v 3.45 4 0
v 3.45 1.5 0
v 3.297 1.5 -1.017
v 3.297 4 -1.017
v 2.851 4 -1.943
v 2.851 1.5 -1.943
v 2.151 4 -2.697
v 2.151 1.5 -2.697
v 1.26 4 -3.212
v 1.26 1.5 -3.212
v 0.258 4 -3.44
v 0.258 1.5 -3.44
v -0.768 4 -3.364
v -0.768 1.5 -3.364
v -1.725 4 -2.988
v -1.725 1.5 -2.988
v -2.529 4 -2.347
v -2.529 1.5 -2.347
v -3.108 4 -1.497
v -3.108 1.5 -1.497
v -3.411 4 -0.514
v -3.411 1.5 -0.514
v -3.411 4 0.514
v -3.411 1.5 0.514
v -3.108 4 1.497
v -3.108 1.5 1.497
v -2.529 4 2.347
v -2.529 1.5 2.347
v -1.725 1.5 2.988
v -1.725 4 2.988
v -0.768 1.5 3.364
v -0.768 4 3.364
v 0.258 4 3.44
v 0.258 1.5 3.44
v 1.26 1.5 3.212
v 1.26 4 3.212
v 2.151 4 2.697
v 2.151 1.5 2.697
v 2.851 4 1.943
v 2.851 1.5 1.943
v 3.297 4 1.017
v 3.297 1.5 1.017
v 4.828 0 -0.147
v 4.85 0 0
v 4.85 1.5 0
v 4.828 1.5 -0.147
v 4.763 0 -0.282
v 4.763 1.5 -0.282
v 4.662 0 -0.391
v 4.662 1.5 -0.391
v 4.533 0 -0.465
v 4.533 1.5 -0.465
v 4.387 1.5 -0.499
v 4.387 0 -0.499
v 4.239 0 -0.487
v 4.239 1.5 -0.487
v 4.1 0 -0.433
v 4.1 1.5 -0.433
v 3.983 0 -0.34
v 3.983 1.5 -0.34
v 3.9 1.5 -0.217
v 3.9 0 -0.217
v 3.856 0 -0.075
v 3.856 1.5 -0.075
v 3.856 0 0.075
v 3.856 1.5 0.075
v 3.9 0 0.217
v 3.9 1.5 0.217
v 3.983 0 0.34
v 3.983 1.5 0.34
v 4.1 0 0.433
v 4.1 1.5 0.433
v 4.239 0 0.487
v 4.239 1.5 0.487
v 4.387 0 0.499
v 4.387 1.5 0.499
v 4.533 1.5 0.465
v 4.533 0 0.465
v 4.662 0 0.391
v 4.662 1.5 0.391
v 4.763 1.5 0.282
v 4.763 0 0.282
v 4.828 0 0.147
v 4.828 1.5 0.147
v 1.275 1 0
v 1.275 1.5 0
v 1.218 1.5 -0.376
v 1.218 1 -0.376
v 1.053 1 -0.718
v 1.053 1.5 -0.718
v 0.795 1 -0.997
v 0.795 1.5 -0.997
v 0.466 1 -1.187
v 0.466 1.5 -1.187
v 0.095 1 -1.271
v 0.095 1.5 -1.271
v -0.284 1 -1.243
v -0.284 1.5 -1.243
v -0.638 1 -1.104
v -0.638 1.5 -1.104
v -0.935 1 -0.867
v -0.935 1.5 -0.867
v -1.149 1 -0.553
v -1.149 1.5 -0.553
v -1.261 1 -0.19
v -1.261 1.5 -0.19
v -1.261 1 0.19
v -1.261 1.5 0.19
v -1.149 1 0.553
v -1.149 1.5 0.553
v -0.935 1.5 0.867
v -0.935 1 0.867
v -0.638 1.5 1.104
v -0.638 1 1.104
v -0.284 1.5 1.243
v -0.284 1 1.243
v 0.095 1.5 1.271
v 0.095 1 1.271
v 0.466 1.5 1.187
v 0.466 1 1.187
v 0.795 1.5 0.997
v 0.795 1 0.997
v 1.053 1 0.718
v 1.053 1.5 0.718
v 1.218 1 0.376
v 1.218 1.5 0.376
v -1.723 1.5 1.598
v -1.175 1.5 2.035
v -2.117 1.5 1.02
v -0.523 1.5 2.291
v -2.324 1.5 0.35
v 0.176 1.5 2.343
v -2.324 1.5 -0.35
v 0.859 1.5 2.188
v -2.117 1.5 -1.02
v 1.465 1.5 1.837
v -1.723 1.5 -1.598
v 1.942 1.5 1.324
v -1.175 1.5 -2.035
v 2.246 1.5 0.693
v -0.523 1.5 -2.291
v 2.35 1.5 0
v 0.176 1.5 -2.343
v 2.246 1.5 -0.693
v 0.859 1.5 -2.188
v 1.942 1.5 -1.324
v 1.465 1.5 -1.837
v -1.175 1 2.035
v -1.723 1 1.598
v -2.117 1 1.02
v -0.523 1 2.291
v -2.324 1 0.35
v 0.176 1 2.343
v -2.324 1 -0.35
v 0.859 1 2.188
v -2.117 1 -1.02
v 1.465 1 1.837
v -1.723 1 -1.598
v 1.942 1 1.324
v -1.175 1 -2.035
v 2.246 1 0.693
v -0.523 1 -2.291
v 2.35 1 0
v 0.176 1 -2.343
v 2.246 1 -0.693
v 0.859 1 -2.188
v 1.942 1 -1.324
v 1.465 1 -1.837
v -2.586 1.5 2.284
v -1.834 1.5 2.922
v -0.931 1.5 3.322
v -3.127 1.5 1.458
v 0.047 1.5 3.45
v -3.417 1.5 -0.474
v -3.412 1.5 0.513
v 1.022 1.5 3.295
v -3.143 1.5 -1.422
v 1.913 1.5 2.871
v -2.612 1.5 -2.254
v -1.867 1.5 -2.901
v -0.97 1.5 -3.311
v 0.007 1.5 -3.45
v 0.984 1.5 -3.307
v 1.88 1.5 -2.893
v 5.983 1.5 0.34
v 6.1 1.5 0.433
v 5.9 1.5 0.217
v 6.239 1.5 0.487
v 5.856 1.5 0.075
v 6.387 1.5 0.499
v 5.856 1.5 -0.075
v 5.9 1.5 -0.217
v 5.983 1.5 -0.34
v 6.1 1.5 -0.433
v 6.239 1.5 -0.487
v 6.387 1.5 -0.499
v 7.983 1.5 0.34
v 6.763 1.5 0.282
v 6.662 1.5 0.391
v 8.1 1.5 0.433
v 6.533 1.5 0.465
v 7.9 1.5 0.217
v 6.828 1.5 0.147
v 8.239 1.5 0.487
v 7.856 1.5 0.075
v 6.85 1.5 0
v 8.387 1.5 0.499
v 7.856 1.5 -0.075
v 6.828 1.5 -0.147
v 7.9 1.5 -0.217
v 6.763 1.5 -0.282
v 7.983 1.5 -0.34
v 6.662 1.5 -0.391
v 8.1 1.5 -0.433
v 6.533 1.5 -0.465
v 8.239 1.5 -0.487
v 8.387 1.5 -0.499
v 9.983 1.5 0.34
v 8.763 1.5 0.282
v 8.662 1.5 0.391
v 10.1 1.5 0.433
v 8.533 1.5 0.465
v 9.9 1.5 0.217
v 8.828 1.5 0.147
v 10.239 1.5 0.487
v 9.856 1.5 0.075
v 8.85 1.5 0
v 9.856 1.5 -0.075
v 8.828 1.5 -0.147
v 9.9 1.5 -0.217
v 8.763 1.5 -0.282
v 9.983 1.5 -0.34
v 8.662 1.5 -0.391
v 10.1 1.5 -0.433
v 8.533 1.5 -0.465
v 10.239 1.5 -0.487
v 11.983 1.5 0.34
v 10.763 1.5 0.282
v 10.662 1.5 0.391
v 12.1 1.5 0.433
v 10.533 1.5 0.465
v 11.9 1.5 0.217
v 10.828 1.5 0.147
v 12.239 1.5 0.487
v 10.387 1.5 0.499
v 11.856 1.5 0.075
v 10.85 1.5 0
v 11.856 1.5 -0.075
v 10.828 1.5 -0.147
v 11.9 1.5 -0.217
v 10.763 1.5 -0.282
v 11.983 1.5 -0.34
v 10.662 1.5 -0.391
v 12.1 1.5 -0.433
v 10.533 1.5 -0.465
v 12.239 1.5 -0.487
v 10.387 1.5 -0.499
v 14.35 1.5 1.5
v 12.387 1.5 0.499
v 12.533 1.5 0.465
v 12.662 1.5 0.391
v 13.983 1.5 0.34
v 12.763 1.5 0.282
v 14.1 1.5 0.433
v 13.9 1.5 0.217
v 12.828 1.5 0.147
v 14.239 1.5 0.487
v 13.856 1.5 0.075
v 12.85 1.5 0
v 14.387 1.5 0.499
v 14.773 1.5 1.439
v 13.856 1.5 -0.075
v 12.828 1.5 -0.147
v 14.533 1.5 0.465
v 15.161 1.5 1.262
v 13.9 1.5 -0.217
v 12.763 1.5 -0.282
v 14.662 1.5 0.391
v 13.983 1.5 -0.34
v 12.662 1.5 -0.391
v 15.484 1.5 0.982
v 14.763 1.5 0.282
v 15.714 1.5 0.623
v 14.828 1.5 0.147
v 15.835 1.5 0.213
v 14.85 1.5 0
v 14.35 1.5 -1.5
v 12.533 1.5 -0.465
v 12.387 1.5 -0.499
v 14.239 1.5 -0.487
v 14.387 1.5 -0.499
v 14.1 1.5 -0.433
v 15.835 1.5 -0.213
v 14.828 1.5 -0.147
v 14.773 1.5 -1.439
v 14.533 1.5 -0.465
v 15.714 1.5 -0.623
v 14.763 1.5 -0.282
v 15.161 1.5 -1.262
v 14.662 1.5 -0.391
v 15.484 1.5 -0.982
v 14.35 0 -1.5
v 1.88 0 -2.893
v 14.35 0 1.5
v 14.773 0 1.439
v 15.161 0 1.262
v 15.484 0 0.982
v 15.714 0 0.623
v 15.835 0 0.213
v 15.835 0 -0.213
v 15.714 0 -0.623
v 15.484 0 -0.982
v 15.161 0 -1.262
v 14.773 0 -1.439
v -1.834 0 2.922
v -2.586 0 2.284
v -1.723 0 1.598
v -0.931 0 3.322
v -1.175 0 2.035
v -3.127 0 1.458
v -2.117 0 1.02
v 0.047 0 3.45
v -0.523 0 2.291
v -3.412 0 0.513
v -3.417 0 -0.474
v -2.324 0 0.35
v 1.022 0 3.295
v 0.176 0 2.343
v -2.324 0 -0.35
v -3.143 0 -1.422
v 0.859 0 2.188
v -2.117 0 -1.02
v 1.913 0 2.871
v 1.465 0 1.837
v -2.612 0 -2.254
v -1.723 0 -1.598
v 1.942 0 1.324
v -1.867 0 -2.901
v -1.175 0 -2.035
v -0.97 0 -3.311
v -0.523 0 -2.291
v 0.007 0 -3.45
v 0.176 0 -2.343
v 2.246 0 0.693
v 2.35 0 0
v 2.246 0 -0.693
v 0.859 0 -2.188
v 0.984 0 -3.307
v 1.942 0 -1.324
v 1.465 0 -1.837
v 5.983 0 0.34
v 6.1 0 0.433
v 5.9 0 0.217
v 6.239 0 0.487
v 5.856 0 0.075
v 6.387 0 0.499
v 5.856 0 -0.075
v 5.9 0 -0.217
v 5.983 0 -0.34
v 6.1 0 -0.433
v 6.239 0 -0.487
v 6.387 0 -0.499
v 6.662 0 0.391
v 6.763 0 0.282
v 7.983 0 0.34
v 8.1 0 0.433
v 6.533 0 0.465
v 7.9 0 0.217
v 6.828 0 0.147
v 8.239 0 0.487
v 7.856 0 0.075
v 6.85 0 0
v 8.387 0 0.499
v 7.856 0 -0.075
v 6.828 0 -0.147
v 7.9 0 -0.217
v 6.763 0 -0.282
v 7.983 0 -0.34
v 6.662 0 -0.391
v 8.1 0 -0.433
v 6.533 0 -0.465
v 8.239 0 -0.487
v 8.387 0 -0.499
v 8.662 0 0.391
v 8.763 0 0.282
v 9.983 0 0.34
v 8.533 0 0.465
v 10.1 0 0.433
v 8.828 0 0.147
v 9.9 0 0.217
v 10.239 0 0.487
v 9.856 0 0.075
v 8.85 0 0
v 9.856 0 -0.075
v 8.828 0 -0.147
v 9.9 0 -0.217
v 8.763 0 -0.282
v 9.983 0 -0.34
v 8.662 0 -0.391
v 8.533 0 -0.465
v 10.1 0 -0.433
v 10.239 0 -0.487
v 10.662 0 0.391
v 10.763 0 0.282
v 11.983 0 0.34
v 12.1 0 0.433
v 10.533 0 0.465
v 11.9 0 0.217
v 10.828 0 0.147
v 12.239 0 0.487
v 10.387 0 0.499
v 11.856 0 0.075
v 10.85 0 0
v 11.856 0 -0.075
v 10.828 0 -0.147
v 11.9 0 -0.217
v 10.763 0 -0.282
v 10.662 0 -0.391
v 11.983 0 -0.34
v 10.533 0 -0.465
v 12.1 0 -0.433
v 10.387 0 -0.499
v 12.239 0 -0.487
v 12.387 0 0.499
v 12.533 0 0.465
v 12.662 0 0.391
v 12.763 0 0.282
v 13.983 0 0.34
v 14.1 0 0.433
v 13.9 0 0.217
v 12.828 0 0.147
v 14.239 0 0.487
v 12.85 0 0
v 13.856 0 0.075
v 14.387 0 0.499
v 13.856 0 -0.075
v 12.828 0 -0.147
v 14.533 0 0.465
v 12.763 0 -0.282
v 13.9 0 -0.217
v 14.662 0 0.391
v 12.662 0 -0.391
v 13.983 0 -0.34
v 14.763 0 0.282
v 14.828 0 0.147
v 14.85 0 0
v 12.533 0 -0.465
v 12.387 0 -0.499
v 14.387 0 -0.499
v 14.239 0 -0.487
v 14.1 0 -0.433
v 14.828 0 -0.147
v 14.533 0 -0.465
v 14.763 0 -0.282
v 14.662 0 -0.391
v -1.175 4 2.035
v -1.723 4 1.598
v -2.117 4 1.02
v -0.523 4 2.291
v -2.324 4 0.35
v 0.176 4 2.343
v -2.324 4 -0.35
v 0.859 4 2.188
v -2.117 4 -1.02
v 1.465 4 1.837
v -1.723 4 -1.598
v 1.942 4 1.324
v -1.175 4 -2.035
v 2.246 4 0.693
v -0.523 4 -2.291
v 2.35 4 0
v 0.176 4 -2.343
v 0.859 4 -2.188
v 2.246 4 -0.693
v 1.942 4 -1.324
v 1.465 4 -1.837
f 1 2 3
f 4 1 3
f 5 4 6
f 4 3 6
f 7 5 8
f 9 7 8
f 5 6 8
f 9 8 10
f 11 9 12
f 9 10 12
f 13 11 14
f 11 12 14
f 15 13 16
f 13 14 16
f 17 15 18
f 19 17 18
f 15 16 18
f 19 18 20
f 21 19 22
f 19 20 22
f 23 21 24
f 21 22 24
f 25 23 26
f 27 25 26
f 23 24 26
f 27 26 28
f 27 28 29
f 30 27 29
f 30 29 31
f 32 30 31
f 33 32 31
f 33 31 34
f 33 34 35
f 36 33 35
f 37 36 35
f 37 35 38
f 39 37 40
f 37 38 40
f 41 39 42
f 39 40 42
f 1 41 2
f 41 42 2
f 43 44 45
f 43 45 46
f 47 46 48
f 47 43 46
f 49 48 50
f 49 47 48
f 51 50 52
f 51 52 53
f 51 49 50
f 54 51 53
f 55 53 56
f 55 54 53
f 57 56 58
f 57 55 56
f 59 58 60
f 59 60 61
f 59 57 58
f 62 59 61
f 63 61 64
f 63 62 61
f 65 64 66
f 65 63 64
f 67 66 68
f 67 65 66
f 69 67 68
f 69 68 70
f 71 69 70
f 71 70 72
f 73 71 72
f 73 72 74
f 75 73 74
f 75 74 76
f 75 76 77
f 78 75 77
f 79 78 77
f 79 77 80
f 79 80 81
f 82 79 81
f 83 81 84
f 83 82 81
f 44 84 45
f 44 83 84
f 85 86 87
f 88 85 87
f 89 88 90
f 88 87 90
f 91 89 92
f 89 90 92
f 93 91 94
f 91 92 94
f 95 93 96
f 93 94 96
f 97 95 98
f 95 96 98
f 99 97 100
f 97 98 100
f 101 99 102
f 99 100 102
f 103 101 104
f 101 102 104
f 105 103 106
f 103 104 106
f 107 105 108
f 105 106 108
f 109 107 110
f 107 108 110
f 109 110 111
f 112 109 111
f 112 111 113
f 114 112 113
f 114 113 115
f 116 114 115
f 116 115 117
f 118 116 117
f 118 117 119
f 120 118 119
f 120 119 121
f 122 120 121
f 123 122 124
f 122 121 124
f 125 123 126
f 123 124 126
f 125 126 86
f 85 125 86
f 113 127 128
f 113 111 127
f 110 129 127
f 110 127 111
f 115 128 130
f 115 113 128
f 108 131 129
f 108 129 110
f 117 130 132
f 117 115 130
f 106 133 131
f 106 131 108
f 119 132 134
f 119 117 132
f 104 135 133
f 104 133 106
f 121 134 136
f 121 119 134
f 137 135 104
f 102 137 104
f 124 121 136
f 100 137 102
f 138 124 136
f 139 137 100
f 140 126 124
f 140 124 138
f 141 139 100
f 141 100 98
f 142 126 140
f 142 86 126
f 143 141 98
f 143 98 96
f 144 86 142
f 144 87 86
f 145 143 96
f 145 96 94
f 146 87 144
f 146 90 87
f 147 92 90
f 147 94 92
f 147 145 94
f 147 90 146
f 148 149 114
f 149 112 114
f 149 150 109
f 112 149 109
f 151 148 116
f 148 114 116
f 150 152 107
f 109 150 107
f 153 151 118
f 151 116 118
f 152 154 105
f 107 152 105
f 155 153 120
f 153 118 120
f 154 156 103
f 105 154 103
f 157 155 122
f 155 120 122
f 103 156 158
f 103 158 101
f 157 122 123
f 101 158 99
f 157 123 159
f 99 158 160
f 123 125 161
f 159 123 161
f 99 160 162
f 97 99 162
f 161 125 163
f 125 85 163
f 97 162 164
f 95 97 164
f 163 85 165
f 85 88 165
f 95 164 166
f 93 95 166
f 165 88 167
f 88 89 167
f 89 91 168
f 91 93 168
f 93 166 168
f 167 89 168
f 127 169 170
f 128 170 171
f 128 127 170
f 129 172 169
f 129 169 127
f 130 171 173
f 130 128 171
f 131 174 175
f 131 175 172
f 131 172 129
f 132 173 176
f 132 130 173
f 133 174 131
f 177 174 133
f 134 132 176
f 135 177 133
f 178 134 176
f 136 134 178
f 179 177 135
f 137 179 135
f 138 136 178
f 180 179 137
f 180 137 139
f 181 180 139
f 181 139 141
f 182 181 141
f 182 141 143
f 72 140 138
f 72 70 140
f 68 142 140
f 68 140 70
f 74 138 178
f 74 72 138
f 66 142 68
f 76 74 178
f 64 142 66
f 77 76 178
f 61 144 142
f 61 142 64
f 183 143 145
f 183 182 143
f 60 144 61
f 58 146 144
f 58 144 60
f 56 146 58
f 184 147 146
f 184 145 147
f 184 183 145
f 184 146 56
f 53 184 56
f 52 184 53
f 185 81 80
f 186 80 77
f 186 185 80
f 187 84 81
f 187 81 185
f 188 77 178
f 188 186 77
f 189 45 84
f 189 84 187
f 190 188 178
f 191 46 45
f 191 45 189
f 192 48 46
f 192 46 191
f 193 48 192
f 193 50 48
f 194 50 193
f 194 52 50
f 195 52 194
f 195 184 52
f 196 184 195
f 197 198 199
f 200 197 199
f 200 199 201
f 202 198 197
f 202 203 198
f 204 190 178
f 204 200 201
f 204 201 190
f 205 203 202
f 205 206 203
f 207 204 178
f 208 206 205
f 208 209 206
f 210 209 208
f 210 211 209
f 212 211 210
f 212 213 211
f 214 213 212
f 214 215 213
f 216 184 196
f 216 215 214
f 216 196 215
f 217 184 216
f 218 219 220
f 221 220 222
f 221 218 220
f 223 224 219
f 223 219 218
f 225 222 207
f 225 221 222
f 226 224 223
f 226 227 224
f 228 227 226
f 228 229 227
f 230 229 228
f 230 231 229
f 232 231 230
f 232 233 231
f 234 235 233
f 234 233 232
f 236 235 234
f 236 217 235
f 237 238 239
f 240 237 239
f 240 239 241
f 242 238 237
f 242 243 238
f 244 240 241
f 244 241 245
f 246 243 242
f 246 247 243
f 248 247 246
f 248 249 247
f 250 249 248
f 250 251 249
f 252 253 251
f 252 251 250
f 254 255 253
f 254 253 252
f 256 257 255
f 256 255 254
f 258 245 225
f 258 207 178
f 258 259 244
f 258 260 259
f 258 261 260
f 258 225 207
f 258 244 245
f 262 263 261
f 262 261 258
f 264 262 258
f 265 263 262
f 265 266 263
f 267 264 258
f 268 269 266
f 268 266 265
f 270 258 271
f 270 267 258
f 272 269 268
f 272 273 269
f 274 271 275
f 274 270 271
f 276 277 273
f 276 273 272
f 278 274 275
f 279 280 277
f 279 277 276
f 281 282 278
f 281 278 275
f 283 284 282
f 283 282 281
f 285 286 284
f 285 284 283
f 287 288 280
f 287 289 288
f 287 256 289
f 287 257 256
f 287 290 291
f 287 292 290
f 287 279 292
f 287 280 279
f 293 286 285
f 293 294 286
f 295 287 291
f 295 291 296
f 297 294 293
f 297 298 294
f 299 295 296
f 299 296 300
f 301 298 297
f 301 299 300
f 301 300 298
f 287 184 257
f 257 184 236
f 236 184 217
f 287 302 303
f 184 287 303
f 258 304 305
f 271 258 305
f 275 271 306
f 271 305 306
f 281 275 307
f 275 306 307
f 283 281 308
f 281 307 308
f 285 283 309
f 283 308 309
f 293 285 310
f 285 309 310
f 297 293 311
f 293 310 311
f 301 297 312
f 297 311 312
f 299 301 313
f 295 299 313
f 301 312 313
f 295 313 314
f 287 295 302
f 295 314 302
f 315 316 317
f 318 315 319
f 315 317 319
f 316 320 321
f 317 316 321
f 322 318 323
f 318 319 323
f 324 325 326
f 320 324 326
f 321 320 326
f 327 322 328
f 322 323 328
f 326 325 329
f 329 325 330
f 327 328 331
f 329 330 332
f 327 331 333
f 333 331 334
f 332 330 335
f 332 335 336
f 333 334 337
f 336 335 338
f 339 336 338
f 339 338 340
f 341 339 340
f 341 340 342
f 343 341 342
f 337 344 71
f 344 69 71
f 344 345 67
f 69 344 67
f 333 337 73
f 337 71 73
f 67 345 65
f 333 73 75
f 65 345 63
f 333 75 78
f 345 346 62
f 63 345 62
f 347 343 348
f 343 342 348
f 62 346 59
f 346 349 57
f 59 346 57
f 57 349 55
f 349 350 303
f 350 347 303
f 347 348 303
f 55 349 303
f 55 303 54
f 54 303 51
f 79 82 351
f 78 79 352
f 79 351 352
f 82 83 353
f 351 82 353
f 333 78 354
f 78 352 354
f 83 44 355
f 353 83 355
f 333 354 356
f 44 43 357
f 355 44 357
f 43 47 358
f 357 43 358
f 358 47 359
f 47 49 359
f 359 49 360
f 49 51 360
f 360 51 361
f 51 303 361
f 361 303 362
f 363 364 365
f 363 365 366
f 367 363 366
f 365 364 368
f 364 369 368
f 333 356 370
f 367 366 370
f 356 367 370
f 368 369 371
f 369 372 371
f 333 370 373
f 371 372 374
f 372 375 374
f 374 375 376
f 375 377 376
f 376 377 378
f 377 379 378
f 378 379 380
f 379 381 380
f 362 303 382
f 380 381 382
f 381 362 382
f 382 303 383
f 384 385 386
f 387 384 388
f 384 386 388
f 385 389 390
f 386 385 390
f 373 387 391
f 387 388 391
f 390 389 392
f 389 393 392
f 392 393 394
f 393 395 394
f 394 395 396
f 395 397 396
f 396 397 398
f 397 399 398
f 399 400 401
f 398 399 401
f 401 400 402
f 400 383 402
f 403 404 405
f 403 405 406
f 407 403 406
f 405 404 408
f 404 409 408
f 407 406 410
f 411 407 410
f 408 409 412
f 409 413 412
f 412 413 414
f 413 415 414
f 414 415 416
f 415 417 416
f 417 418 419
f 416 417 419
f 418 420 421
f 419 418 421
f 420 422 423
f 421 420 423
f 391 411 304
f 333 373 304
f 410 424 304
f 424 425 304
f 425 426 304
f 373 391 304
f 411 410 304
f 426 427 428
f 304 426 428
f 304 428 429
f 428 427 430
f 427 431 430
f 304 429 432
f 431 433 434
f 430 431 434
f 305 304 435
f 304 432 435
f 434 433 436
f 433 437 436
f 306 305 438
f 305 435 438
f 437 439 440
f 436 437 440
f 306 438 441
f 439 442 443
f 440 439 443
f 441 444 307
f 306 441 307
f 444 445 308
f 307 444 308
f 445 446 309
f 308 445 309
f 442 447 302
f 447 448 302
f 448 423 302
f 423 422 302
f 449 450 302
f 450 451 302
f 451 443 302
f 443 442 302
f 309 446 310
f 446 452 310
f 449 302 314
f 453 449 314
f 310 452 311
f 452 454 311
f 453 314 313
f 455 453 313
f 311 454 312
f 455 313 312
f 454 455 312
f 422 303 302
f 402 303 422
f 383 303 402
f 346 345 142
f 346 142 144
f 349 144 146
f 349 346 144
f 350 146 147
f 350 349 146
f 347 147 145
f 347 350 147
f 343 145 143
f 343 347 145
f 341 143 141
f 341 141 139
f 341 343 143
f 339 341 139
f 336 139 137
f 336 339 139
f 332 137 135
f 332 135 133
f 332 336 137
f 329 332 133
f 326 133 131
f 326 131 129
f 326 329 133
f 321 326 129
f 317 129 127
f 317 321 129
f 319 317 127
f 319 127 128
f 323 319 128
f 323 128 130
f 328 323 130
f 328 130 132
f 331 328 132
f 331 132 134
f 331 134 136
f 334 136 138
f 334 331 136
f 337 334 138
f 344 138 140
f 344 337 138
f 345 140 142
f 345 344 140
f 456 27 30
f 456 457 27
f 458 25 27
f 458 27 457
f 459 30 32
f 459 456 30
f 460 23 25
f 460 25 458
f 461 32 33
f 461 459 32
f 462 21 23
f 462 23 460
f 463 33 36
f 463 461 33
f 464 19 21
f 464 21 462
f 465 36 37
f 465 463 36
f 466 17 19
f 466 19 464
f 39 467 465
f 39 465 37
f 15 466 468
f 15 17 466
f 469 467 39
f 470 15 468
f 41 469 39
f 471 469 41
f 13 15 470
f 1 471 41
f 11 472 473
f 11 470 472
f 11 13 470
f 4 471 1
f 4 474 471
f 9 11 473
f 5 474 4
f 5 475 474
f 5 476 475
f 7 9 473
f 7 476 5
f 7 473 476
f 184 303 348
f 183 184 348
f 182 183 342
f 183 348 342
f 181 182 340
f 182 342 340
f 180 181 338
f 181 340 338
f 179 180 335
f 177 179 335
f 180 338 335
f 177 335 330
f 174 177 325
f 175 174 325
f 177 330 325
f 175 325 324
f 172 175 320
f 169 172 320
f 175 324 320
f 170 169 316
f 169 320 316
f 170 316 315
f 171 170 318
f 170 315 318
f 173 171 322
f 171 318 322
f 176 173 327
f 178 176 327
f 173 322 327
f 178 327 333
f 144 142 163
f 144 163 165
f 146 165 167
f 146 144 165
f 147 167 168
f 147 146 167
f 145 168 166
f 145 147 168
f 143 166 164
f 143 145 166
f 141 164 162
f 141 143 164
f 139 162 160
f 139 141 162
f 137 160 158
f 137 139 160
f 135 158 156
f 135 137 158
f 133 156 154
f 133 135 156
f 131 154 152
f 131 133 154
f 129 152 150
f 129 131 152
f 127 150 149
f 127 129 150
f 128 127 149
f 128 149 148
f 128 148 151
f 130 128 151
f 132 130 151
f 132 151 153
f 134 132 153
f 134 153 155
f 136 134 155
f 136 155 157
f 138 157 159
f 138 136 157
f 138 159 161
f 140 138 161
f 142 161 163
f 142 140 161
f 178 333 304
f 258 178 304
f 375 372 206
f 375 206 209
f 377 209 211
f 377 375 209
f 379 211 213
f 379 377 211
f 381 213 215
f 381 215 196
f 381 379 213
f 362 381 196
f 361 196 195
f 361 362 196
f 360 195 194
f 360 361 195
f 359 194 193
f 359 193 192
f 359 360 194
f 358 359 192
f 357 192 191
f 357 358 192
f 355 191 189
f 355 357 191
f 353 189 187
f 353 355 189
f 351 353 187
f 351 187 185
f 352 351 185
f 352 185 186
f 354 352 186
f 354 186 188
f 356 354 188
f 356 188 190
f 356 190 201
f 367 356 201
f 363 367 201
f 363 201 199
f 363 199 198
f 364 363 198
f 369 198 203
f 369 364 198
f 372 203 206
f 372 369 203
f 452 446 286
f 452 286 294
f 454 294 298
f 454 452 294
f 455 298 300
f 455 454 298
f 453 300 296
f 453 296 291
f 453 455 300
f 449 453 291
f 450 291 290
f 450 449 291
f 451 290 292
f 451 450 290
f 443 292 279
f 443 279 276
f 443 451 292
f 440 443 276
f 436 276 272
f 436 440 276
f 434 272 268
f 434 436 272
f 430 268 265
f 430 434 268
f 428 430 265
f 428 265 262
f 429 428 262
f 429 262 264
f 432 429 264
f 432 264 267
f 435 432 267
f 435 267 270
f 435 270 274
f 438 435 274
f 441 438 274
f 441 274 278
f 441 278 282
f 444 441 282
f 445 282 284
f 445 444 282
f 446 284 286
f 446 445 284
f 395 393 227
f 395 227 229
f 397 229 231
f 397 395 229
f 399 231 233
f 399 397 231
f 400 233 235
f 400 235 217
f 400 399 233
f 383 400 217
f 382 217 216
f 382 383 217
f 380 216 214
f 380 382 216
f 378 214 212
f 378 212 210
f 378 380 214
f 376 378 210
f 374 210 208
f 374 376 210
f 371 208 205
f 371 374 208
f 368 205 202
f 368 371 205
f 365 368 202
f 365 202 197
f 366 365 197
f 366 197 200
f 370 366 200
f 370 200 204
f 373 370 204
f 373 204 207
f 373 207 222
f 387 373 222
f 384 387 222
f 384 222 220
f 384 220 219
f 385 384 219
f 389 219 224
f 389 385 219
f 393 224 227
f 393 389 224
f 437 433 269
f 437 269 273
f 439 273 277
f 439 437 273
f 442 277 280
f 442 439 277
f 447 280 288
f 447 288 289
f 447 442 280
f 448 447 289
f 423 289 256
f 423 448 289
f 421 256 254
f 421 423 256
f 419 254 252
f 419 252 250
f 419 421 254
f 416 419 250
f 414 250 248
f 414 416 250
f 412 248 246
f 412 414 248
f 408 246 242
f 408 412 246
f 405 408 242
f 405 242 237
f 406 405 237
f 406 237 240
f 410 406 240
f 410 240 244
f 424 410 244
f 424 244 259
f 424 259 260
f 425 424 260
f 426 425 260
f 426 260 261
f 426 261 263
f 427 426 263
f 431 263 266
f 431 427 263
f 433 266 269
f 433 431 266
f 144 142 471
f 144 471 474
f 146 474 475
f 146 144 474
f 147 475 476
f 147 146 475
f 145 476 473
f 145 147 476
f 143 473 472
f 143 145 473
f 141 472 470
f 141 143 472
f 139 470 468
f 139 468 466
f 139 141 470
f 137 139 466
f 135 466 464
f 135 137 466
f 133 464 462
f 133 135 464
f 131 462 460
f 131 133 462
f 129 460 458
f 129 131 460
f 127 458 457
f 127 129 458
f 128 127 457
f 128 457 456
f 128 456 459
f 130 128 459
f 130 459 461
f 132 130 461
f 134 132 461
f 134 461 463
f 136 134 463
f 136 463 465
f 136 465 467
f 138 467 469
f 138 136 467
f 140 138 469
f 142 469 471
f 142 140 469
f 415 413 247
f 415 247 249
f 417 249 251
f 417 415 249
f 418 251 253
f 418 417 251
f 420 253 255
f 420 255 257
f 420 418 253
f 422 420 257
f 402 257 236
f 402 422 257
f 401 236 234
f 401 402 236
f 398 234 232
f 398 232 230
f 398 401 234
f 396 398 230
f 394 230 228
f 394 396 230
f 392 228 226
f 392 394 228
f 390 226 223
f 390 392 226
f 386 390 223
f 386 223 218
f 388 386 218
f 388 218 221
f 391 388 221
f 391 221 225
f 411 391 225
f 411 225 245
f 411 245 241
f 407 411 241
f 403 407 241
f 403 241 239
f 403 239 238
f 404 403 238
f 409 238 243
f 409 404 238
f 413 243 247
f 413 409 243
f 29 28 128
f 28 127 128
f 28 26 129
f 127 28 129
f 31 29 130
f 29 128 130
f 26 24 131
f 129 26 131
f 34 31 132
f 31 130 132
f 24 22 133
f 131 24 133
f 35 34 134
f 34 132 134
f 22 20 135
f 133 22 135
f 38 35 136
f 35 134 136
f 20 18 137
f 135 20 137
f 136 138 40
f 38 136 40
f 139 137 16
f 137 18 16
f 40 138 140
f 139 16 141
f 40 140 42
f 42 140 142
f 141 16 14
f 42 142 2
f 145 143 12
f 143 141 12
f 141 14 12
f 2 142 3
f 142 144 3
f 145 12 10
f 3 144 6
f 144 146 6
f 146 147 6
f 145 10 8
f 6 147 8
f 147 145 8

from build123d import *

# Parameters (mm, degrees)
SKETCH1_R           = 2.35
SKETCH1_R_2         = 0.5
BOSS_EXTRUDE1_DEPTH = 1.5
SKETCH2_R           = 2.35
SKETCH2_R_2         = 1.275
BOSS_EXTRUDE3_DEPTH = 0.5
SKETCH2_7_R         = 3.45
SKETCH2_7_R_2       = 2.35
BOSS_EXTRUDE5_DEPTH = 2.5


with BuildPart() as part:
    # Sketch1 → Boss-Extrude1 (new body)
    with BuildSketch(Plane(origin=(0, 0, 0), x_dir=(1, 0, 0), z_dir=(0, 1, 0))):
        with BuildLine():
            Line((14.35, 1.5), (1.879742768, 2.892933999))
            ThreePointArc((1.879742768, 2.892933999), (-3.449941889, -0.020024107), (1.913197247, -2.870919068))
            Line((1.913197247, -2.870919068), (14.35, -1.5))
            ThreePointArc((14.35, -1.5), (15.85, 0), (14.35, 1.5))
        make_face()
        Circle(SKETCH1_R, mode=Mode.SUBTRACT)
        with Locations((12.35, 0)):
            Circle(SKETCH1_R_2, mode=Mode.SUBTRACT)
        with Locations((14.35, 0)):
            Circle(SKETCH1_R_2, mode=Mode.SUBTRACT)
        with Locations((10.35, 0)):
            Circle(SKETCH1_R_2, mode=Mode.SUBTRACT)
        with Locations((8.35, 0)):
            Circle(SKETCH1_R_2, mode=Mode.SUBTRACT)
        with Locations((6.35, 0)):
            Circle(SKETCH1_R_2, mode=Mode.SUBTRACT)
        with Locations((4.35, 0)):
            Circle(SKETCH1_R_2, mode=Mode.SUBTRACT)
    extrude(amount=BOSS_EXTRUDE1_DEPTH)


with BuildPart() as body_2:
    # Sketch2 → Boss-Extrude3 (new body)
    with BuildSketch(Plane(origin=(0, 1.5, 0), x_dir=(1, 0, 0), z_dir=(0, 1, 0))):
        Circle(SKETCH2_R)
        Circle(SKETCH2_R_2, mode=Mode.SUBTRACT)
    extrude(amount=-BOSS_EXTRUDE3_DEPTH)


with BuildPart() as body_3:
    # Sketch2<7> → Boss-Extrude5 (new body)
    with BuildSketch(Plane(origin=(0, 1.5, 0), x_dir=(1, 0, 0), z_dir=(0, 1, 0))):
        Circle(SKETCH2_7_R)
        Circle(SKETCH2_7_R_2, mode=Mode.SUBTRACT)
    extrude(amount=BOSS_EXTRUDE5_DEPTH)


solid = Compound([part.part, body_2.part, body_3.part])
